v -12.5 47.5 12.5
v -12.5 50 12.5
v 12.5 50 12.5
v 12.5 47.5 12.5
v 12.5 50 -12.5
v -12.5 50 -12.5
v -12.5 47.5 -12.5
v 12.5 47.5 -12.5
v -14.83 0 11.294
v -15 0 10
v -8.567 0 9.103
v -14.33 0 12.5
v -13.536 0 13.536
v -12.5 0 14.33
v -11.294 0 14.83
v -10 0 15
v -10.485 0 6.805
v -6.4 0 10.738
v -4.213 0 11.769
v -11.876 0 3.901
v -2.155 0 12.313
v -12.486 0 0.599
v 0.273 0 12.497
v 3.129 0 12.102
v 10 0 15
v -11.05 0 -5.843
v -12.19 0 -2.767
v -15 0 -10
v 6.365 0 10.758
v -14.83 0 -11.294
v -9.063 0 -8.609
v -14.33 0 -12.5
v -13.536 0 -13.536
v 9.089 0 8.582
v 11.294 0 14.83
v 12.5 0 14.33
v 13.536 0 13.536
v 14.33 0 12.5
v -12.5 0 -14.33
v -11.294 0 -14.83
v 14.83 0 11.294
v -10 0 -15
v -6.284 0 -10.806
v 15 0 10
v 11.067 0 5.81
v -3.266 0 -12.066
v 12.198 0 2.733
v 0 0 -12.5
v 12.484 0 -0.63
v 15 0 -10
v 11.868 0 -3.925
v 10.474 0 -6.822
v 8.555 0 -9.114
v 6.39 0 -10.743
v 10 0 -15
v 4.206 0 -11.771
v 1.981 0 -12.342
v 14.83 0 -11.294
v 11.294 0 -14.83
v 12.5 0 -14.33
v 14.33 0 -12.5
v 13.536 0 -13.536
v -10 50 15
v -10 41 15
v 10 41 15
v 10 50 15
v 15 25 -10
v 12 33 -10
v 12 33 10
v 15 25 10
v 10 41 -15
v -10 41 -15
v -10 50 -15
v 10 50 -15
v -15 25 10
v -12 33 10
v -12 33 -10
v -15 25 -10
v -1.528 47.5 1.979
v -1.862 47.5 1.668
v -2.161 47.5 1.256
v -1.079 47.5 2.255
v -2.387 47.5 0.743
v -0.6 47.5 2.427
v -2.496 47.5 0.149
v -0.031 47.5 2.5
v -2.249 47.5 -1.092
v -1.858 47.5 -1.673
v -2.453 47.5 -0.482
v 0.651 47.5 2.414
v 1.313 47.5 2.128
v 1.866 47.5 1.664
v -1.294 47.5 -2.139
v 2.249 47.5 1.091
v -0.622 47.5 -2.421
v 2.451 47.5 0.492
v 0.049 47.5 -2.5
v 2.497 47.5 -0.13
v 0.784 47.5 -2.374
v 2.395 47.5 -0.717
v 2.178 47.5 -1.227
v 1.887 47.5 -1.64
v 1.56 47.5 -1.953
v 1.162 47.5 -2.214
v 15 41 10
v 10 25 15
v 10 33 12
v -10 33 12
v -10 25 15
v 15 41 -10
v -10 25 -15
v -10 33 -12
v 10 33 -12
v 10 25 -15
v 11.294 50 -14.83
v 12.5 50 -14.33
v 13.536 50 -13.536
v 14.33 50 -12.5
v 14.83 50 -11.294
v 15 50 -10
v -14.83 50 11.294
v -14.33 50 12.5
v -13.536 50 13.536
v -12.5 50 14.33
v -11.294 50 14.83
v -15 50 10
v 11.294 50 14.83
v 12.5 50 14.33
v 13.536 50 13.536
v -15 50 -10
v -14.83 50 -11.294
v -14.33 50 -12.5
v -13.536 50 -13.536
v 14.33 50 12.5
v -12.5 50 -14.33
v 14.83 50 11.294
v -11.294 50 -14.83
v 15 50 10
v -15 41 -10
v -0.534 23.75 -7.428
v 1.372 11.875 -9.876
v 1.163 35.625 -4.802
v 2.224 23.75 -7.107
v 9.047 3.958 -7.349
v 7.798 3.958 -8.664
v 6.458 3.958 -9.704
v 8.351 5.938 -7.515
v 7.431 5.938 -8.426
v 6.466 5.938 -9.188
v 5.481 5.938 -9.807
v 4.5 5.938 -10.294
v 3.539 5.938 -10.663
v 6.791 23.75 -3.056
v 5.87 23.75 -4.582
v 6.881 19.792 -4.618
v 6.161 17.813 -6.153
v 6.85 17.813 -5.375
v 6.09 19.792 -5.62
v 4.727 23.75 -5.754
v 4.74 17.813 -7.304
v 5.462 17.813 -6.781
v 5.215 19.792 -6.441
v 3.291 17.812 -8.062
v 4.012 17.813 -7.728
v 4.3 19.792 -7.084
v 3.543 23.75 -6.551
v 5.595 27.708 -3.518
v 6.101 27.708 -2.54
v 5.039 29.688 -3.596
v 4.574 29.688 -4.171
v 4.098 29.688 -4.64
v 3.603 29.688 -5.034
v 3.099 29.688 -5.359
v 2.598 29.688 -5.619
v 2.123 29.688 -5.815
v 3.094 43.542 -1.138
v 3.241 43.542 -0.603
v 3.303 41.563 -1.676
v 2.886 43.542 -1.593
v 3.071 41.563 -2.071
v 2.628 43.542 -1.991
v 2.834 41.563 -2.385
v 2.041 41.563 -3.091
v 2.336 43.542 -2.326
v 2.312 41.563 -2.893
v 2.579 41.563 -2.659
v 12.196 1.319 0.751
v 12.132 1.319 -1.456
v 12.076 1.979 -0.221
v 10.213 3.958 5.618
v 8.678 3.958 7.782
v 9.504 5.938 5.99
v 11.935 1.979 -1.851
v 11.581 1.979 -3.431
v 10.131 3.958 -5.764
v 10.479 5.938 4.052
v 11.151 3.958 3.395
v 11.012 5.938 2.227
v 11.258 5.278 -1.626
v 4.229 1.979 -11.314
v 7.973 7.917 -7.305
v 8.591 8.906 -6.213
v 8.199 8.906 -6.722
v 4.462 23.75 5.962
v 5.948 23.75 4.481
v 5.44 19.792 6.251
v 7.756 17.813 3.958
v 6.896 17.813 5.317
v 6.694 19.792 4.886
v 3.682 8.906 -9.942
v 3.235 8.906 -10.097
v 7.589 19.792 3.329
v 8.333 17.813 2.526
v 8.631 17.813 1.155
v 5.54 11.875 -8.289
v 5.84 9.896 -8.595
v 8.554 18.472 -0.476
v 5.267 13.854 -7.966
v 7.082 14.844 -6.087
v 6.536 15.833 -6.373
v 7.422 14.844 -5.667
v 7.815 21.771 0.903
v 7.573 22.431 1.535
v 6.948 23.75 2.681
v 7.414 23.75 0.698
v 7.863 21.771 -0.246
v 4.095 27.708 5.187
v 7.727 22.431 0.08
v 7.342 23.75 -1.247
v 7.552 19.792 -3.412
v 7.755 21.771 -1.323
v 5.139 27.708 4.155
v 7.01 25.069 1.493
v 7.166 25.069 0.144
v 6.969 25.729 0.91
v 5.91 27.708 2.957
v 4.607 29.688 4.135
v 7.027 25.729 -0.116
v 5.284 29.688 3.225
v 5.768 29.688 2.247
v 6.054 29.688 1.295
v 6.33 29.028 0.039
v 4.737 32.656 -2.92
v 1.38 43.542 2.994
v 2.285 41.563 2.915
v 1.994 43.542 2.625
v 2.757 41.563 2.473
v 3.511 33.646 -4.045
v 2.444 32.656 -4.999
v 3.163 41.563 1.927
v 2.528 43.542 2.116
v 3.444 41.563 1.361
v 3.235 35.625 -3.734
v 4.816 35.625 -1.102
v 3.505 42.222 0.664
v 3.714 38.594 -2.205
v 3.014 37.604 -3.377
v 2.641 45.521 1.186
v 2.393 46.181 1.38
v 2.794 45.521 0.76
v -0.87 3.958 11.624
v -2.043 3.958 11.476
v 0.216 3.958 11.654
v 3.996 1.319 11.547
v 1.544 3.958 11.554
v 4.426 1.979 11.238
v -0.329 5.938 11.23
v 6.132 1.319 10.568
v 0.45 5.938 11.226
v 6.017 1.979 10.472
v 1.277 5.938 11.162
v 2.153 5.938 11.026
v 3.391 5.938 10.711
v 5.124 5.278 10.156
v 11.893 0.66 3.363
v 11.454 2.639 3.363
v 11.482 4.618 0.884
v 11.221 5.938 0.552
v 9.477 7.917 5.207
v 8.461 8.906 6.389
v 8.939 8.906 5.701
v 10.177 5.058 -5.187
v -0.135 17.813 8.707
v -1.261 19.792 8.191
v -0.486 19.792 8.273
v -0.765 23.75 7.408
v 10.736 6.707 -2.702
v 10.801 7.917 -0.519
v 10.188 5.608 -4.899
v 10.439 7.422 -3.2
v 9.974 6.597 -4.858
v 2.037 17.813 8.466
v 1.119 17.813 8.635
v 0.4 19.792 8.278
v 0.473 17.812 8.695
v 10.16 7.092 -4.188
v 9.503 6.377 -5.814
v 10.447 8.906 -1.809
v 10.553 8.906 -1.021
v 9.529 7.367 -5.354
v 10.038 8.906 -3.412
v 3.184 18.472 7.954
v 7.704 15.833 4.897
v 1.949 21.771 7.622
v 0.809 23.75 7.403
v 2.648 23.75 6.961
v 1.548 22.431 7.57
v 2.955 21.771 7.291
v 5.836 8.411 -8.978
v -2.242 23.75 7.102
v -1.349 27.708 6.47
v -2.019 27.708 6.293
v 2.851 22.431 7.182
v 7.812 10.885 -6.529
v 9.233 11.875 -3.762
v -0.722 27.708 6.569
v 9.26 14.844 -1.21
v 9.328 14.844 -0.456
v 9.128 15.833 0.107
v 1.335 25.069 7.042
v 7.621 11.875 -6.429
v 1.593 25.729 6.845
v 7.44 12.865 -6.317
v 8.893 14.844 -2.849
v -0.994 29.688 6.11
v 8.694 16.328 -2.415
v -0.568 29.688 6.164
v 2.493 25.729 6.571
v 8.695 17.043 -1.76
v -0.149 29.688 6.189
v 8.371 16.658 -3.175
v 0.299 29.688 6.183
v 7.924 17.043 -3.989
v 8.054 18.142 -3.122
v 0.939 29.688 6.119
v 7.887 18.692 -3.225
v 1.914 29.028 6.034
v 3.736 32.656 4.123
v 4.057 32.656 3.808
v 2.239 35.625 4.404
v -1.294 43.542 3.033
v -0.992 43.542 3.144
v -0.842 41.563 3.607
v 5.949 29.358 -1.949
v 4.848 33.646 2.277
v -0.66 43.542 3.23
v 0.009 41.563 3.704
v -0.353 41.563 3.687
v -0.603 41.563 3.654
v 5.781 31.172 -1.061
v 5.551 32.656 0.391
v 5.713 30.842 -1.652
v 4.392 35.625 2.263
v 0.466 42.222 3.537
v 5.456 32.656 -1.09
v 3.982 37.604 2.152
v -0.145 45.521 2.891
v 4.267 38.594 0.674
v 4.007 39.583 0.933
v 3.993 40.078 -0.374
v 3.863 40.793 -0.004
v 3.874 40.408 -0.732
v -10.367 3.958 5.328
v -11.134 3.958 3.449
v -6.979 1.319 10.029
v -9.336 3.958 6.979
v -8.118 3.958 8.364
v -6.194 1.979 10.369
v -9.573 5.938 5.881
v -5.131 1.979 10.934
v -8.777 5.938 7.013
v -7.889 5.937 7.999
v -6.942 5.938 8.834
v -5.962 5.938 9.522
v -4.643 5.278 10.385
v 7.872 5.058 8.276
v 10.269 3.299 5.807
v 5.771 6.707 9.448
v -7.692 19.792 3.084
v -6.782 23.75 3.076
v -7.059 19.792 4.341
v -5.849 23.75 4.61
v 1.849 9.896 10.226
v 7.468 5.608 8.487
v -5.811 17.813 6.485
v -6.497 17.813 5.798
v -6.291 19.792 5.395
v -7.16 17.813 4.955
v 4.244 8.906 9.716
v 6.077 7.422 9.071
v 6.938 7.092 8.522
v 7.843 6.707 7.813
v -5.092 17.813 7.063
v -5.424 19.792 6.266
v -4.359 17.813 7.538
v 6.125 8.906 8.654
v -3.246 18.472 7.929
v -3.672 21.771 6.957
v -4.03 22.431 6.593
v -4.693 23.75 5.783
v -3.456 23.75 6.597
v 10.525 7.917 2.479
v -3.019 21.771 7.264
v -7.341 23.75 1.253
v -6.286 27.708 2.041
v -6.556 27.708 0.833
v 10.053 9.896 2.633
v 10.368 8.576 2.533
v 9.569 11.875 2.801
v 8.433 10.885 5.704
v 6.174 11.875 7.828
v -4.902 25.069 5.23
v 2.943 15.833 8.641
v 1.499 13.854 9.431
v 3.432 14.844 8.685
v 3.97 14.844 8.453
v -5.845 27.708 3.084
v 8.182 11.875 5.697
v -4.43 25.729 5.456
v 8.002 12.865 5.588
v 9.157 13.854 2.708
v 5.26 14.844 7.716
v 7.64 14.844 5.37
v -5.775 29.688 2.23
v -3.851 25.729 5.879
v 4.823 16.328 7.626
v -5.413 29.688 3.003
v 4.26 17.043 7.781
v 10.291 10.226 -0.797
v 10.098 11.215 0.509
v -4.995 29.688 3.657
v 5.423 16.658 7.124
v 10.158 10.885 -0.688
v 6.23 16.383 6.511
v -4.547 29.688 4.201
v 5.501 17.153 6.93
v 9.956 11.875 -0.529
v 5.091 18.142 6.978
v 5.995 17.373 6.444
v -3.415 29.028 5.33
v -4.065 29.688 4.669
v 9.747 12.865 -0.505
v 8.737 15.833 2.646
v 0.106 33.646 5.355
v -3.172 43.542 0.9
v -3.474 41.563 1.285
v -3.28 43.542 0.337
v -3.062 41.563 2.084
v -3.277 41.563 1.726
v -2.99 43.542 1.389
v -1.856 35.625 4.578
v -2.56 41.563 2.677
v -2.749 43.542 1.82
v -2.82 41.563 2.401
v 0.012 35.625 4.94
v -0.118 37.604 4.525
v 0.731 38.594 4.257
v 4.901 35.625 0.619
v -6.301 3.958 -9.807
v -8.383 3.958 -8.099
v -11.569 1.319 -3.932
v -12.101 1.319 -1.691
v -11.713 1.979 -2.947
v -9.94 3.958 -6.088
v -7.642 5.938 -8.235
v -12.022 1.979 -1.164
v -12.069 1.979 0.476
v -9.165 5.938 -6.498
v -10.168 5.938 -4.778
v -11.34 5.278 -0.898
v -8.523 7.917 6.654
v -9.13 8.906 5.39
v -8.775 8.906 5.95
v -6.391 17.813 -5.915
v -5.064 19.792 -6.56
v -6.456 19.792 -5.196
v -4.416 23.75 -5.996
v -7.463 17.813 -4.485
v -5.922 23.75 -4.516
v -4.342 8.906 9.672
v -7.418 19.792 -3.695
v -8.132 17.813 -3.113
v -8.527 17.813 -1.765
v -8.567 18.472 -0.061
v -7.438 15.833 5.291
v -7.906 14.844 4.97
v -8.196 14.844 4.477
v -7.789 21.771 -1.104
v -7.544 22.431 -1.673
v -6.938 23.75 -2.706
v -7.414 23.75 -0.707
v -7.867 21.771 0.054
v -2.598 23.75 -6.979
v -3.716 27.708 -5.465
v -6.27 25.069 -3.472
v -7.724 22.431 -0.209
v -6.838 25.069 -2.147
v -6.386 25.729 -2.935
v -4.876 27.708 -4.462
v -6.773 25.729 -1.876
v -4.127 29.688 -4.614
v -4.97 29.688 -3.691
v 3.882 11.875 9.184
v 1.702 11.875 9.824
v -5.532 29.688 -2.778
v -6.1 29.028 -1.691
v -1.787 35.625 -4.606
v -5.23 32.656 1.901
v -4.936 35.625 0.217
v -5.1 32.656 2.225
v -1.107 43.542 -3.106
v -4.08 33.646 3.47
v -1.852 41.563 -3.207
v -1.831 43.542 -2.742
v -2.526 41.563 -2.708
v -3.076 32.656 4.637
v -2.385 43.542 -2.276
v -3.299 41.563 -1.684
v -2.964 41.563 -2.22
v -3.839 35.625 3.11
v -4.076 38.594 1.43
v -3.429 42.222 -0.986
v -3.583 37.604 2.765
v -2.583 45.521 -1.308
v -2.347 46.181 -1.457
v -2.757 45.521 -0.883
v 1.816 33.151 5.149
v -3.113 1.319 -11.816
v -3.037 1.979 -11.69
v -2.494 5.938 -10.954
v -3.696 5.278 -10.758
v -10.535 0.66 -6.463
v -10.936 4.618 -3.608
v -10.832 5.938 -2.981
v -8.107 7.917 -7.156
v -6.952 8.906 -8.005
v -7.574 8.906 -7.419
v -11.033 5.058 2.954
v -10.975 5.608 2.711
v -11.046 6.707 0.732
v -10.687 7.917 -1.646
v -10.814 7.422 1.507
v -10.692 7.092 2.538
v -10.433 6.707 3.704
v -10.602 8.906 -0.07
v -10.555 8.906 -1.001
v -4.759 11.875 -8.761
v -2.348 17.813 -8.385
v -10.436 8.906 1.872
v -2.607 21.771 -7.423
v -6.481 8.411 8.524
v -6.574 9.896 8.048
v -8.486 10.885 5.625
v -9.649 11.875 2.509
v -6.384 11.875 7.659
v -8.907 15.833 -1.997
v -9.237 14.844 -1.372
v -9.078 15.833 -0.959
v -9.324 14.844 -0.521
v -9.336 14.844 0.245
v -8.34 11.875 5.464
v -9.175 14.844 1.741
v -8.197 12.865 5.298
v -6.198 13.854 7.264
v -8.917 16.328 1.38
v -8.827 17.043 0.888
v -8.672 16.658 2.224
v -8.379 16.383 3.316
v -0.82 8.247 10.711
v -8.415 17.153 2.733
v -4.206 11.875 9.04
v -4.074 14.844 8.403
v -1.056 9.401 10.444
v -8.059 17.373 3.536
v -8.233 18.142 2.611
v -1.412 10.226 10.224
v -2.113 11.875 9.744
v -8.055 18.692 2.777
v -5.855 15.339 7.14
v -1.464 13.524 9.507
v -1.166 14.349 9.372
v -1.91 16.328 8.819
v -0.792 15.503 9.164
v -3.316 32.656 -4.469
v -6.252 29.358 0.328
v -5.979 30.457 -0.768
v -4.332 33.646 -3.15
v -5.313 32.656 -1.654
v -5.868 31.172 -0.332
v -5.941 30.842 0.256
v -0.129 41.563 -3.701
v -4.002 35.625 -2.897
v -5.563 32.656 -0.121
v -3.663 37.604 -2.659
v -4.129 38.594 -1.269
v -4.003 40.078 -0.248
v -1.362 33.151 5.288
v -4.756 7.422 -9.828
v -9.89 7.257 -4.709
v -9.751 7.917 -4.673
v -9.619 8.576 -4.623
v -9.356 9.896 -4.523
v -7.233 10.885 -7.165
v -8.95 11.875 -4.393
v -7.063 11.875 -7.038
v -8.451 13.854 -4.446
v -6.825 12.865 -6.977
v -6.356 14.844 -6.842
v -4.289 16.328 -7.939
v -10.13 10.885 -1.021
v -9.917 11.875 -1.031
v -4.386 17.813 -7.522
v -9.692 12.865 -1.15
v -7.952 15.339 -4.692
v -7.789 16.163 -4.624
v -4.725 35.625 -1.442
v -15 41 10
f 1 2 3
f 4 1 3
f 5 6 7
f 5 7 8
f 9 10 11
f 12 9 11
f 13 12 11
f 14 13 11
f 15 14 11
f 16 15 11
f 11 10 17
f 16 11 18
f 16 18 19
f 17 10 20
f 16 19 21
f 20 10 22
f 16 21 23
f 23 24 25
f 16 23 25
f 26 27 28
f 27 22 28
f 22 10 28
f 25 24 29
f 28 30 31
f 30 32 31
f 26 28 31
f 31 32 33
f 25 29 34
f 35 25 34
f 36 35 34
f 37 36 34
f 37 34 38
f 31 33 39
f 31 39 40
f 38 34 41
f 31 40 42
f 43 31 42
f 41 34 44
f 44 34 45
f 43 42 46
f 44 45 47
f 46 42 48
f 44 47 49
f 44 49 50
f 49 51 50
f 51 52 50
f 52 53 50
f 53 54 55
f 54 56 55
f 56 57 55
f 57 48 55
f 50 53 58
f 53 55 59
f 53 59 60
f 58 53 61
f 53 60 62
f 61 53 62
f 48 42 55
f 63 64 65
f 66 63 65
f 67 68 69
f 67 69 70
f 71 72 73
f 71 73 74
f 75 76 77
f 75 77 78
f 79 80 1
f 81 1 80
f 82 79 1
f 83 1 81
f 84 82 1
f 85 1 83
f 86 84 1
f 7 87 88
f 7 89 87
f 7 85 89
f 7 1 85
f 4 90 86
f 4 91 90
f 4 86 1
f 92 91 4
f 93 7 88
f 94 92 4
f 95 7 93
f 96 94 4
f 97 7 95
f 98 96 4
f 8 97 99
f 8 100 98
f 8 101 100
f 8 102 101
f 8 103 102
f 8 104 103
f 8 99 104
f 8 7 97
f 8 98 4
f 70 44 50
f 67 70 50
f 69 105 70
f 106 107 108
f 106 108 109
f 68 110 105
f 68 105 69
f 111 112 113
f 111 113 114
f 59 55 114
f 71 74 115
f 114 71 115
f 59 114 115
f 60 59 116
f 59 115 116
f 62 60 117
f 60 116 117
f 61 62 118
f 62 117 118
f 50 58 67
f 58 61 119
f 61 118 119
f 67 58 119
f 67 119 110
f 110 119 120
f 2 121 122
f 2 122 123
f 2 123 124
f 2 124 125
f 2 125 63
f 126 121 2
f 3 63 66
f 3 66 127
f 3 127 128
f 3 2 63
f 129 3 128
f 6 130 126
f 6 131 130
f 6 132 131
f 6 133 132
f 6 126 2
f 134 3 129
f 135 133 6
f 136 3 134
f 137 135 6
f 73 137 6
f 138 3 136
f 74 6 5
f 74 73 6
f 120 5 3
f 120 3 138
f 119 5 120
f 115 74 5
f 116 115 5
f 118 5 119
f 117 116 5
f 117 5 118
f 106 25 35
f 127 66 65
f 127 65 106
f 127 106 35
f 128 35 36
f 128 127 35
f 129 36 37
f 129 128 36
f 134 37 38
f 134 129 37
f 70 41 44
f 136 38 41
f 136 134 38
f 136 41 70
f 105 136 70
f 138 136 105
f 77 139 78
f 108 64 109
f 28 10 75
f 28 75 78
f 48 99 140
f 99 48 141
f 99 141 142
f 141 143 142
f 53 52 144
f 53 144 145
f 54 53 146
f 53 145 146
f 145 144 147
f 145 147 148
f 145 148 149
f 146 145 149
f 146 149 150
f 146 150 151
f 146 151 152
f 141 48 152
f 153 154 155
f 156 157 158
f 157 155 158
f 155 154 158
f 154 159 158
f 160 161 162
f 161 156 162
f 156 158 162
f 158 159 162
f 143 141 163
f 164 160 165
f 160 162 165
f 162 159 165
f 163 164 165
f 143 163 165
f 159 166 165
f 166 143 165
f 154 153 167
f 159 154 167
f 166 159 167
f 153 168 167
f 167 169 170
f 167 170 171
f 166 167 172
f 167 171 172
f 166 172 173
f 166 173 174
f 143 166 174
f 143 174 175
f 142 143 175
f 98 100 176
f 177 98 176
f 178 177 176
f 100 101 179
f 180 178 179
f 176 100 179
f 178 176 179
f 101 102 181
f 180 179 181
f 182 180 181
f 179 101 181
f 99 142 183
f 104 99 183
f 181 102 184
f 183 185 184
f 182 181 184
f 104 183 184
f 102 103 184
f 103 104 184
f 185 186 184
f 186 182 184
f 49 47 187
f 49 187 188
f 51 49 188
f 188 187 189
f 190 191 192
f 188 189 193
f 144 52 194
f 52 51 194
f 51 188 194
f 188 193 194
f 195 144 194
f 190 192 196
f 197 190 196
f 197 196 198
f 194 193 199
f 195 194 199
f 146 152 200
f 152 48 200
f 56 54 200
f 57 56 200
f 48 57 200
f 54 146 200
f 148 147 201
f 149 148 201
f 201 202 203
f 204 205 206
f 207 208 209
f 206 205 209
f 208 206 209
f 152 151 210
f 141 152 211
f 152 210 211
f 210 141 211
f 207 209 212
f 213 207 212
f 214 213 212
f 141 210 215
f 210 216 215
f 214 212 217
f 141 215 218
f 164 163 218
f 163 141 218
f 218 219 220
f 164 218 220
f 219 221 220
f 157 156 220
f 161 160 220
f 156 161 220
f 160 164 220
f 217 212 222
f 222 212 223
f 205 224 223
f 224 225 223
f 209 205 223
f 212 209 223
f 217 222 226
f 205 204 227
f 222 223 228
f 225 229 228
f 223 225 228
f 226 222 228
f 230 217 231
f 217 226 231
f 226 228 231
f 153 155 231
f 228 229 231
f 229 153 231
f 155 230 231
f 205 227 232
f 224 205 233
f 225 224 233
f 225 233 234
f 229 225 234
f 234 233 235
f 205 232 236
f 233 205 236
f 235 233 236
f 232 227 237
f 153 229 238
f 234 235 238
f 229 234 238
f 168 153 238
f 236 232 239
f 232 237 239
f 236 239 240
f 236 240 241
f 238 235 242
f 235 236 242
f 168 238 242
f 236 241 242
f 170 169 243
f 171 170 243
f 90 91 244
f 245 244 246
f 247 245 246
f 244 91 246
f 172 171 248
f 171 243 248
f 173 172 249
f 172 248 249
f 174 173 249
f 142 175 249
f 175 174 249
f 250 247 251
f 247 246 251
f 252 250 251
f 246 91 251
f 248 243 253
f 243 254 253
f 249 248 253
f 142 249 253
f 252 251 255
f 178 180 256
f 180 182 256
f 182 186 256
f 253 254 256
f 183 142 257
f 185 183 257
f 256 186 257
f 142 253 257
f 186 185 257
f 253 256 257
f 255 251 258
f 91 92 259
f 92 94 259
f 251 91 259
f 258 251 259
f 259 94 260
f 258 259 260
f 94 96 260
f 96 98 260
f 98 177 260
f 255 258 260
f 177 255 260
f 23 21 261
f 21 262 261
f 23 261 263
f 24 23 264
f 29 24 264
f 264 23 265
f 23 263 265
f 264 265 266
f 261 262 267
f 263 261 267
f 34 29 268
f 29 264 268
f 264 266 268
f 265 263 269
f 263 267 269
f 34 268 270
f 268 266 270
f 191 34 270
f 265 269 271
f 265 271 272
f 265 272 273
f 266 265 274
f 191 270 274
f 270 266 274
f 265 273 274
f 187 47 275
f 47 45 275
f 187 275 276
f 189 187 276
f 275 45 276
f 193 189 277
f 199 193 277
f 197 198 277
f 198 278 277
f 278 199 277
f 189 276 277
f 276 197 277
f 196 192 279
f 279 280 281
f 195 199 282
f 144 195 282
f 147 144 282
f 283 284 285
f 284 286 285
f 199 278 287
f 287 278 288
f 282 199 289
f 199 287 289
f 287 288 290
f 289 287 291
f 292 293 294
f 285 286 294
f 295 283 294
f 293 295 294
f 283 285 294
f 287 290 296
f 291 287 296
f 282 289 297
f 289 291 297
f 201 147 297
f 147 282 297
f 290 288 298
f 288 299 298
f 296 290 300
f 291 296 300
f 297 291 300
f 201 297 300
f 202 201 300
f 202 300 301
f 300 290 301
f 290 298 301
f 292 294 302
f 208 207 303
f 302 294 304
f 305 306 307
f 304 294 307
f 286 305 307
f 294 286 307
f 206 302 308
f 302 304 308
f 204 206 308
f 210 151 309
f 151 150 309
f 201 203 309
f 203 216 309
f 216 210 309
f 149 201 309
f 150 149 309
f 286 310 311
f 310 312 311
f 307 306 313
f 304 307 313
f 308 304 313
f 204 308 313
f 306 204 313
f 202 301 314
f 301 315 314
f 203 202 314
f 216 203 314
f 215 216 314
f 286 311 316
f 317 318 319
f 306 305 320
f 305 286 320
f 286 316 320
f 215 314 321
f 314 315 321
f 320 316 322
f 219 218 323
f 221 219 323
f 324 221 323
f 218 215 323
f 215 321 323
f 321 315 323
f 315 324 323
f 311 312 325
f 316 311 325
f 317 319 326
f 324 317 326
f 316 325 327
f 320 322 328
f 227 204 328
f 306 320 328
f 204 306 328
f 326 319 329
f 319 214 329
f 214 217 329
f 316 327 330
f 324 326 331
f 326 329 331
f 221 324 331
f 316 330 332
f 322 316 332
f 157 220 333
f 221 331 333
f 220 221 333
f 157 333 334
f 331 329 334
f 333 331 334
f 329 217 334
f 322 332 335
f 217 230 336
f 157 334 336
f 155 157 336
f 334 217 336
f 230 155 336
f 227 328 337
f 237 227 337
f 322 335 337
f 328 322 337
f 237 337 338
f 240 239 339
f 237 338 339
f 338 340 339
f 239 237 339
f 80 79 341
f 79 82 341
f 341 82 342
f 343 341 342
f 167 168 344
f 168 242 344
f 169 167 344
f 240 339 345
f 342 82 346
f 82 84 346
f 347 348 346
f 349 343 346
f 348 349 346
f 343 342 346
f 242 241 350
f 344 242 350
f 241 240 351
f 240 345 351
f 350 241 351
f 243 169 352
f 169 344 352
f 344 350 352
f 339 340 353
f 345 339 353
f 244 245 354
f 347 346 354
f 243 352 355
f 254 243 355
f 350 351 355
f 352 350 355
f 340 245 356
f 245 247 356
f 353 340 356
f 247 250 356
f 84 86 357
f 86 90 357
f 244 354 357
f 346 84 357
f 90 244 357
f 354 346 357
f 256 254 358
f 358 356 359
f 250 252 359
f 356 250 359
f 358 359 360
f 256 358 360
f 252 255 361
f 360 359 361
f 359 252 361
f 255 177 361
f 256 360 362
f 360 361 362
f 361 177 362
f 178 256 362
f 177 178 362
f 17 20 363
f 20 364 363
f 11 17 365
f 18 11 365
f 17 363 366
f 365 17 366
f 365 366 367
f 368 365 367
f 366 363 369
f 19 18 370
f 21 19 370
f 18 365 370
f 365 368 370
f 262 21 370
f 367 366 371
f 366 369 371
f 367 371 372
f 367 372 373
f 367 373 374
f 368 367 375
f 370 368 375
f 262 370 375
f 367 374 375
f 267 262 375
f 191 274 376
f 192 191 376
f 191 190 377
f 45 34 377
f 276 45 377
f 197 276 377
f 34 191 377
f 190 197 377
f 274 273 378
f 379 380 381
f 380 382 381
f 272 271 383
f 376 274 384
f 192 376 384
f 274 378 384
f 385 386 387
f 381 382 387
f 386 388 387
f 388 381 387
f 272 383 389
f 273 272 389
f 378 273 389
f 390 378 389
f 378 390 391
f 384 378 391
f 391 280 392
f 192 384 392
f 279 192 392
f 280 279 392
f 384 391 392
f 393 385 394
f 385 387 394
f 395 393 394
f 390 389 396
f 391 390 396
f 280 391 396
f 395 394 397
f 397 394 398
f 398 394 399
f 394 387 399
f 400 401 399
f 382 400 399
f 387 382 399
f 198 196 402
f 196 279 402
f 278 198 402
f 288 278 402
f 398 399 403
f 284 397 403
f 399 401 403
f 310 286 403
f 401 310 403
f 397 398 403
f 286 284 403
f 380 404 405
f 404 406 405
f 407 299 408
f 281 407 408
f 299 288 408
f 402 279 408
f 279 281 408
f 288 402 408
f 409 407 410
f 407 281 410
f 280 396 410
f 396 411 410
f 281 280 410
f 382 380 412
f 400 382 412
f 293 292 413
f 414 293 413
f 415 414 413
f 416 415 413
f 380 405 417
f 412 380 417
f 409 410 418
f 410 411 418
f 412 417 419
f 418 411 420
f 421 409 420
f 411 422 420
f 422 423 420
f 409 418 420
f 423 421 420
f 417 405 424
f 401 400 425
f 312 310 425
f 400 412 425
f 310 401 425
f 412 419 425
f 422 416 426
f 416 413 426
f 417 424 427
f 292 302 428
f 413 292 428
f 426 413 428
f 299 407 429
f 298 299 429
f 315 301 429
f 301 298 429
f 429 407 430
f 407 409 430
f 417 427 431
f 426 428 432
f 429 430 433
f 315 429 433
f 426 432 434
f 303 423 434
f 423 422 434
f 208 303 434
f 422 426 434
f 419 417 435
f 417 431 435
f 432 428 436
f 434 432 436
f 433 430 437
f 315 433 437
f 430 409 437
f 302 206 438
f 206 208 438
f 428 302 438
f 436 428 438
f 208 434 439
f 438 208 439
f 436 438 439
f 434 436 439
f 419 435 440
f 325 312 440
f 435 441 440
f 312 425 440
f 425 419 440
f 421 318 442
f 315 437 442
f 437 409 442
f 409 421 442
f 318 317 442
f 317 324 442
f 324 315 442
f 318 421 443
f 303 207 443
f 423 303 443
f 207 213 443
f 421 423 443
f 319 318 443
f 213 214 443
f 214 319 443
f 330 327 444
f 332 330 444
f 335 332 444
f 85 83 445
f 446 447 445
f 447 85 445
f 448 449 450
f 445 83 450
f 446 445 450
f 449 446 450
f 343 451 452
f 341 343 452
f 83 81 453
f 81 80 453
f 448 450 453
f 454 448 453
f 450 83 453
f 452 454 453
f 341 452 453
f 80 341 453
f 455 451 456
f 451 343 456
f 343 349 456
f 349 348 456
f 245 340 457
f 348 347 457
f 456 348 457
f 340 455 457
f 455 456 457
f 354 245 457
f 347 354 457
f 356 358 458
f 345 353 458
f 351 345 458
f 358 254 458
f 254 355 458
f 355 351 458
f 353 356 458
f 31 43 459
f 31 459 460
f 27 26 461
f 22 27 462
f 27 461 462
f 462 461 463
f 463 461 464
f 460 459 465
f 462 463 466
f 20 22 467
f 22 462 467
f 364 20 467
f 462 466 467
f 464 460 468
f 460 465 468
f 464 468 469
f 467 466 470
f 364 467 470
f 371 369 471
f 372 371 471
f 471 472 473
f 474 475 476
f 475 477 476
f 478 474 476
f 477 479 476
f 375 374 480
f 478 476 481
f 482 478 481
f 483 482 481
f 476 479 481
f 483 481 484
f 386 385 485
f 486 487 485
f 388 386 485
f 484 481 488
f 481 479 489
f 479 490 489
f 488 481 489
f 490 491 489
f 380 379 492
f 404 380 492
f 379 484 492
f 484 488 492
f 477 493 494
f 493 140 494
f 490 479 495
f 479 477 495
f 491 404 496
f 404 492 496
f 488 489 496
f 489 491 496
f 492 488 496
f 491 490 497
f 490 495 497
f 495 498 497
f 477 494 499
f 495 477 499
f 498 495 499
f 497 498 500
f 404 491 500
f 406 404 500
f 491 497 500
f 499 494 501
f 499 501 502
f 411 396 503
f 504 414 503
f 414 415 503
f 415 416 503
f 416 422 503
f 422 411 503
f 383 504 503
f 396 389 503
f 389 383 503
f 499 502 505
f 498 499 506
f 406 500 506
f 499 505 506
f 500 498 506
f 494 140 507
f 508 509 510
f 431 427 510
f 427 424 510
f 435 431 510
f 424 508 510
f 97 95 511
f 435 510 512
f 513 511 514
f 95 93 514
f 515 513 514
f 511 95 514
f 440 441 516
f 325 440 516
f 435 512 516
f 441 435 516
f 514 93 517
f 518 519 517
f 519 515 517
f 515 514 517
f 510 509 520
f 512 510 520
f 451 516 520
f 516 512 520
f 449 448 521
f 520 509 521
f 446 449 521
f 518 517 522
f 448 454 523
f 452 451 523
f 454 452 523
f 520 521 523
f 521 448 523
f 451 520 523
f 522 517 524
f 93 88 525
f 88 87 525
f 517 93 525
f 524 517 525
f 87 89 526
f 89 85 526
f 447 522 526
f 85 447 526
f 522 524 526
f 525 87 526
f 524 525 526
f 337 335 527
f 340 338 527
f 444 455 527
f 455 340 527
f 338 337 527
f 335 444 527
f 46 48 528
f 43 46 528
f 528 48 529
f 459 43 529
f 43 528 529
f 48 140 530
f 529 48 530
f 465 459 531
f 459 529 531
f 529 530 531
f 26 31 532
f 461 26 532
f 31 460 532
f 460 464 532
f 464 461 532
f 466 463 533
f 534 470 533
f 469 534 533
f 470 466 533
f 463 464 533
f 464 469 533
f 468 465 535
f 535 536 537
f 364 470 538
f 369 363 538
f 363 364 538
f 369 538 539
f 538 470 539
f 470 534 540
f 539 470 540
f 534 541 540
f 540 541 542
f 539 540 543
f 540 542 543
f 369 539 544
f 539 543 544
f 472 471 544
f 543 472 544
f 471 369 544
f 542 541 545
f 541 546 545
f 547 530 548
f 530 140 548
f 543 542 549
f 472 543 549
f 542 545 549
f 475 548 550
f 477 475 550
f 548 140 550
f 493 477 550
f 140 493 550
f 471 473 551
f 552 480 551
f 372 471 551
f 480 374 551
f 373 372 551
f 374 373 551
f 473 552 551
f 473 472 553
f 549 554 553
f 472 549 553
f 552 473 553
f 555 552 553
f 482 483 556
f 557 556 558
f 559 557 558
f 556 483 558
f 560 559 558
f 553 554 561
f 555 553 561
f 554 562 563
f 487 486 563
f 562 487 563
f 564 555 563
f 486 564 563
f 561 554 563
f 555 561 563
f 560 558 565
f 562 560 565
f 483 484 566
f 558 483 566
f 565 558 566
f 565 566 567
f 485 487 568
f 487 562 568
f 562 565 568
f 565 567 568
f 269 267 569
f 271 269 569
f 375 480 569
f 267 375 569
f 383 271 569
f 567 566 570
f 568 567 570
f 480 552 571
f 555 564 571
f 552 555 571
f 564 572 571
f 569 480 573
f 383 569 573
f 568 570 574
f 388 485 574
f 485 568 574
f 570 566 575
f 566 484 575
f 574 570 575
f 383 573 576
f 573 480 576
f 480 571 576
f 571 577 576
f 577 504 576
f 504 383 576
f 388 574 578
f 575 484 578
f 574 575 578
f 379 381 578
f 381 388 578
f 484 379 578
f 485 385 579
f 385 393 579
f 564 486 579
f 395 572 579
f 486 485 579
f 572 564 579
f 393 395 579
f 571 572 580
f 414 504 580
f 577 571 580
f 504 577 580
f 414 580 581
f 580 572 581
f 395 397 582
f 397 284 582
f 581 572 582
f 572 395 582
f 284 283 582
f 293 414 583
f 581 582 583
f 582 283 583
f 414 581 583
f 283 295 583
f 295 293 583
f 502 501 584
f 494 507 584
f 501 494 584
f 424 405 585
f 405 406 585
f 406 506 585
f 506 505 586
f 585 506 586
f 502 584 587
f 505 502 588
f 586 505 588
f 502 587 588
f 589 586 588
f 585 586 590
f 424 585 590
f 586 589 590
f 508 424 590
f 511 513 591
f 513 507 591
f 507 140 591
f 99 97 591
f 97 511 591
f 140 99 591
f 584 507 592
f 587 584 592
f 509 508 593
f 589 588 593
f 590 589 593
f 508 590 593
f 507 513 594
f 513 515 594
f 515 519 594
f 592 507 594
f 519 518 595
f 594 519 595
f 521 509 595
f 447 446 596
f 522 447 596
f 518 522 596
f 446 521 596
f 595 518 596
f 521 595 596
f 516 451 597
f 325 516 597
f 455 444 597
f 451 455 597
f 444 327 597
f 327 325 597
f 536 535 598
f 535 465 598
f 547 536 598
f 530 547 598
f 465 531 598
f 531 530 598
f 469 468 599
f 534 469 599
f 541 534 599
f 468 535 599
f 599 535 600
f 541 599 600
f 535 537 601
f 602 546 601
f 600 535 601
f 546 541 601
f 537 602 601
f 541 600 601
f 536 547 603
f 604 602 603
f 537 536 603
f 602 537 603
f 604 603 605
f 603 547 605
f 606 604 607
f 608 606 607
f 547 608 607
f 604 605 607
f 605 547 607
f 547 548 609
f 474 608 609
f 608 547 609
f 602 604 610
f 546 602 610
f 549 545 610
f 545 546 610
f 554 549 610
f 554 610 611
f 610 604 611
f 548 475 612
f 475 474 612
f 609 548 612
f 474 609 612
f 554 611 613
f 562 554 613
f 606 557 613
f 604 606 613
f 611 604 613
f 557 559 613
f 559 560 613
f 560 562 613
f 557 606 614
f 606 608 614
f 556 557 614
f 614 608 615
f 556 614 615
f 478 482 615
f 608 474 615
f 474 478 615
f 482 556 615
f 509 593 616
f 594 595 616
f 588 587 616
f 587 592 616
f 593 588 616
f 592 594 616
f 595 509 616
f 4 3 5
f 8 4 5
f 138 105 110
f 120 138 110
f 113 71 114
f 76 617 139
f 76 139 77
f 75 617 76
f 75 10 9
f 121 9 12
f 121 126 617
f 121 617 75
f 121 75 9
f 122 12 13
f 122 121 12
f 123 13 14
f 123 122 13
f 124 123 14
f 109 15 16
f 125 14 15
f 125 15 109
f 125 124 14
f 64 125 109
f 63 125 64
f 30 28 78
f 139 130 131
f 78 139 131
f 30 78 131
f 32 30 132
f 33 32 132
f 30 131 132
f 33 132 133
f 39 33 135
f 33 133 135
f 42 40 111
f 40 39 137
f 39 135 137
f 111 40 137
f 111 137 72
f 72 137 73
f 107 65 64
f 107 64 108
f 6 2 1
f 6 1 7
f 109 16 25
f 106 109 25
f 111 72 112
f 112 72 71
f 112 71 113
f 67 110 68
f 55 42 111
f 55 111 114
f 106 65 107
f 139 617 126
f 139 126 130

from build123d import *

# Parameters (mm, degrees)
SKETCH2_W           = 30
SKETCH2_H           = 30
BOSS_EXTRUDE1_DEPTH = 50
SKETCH3_W           = 25
SKETCH3_H           = 25
CUT_EXTRUDE1_DEPTH  = 2.5
FILLET1_R           = 5
CIRPATTERN1_COUNT   = 4


with BuildPart() as part:
    # Sketch2 → Boss-Extrude1 (new body)
    with BuildSketch(Plane(origin=(0, 0, 0), x_dir=(1, 0, 0), z_dir=(0, 1, 0))):
        Rectangle(SKETCH2_W, SKETCH2_H)
    extrude(amount=BOSS_EXTRUDE1_DEPTH)

    # Sketch3 → Cut-Extrude1 (cut)
    with BuildSketch(Plane(origin=(0, 50, 0), x_dir=(1, 0, 0), z_dir=(0, 1, 0))):
        Rectangle(SKETCH3_W, SKETCH3_H)
    extrude(amount=-CUT_EXTRUDE1_DEPTH, mode=Mode.SUBTRACT)

    # Fillet1
    fillet1_edges = [part.edges().sort_by_distance(p)[0] for p in [
        (15, 25, 15),
        (-15, 25, 15),
        (-15, 25, -15),
        (15, 25, -15),
    ]]
    fillet(fillet1_edges, radius=FILLET1_R)

    # Cut-Loft2: read off the stored shape, not the designer's step
    # Cut-Loft2: loft between two sections, ruled curve by curve
    cut_loft2_from = [
        Edge.make_bspline([(0, 0, -12.5), (-25, 0, -12.5), (-25, 0, 12.5), (0, 0, 12.5), (25, 0, 12.5), (25, 0, -12.5), (0, 0, -12.5)], [0, 0, 0, 0, 0.5, 0.5, 0.5, 1, 1, 1, 1], 3, [1, 0.333333333, 0.333333333, 1, 0.333333333, 0.333333333, 1]),
    ]
    cut_loft2_to = [
        Edge.make_bspline([(0.784484005, 47.5, -2.373728048), (-3.962972092, 47.5, -3.942696057), (-5.531940101, 47.5, 0.804760039), (-0.784484005, 47.5, 2.373728048), (3.962972092, 47.5, 3.942696057), (5.531940101, 47.5, -0.804760039), (0.784484005, 47.5, -2.373728048)], [0, 0, 0, 0, 0.5, 0.5, 0.5, 1, 1, 1, 1], 3, [1, 0.333333333, 0.333333333, 1, 0.333333333, 0.333333333, 1]),
    ]
    cut_loft2 = Solid(Shell([*[Face.make_surface_from_curves(cut_loft2_from[k], cut_loft2_to[k]) for k in range(1)], Face(Wire(cut_loft2_from)), Face(Wire(cut_loft2_to))]))
    add(cut_loft2, mode=Mode.SUBTRACT)

    # Cut-Sweep1: sweep along a curve in space
    with BuildLine() as cut_sweep1_path:
        Line((-10, 50, 15), (10, 50, 15))
    # Sketch9 → Cut-Sweep1 (sweep, cut)
    with BuildSketch(Plane.ZY):
        Polygon((15, 41), (12, 33), (15, 25), align=None)
    cut_sweep1 = sweep(path=cut_sweep1_path.line, mode=Mode.SUBTRACT)

    # CirPattern1: Cut-Sweep1 ×4 about axis
    cirpattern1_axis = Axis((0, 0, 0), (0, 1, 0))
    for i in range(1, CIRPATTERN1_COUNT):
        add(cut_sweep1.rotate(cirpattern1_axis, i * 360 / CIRPATTERN1_COUNT), mode=Mode.SUBTRACT)


solid = part.part
